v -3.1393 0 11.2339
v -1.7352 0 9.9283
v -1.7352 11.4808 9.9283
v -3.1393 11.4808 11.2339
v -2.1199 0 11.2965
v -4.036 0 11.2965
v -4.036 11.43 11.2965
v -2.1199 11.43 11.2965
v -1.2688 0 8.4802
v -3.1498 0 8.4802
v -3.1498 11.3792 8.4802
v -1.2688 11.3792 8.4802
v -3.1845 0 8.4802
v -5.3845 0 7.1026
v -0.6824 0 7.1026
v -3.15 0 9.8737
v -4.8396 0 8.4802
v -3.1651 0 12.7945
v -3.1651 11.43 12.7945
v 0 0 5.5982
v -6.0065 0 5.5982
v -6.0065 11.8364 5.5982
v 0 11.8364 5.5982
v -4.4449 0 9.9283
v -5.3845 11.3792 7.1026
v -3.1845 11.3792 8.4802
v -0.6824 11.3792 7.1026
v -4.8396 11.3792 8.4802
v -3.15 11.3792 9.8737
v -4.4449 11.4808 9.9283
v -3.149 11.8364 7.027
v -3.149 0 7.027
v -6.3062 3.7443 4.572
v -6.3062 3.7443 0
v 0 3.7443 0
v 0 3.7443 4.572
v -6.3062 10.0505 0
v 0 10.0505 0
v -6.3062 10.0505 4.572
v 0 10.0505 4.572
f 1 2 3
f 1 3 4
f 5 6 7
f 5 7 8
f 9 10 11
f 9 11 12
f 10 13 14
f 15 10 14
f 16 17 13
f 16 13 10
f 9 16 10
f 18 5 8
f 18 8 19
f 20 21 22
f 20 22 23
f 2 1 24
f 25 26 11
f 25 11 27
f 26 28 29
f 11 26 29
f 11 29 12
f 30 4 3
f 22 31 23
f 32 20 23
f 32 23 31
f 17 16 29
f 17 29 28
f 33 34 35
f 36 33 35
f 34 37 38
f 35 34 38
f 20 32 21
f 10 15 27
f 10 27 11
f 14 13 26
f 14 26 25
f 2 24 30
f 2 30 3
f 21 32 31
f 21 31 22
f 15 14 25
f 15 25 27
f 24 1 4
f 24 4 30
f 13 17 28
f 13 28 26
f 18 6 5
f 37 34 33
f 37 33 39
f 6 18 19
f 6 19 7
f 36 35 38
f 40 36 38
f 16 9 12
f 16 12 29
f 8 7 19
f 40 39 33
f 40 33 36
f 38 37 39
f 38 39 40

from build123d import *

# Parameters (mm, degrees)
F0_W      = 6.306209
F0_H      = 6.306208
F1_DEPTH  = 4.572
F3_DEPTH  = 11.43
F5_DEPTH  = 11.4808
F7_DEPTH  = 11.3792
F9_DEPTH  = 11.3792
F11_DEPTH = 11.8364


with BuildPart() as f1:
    # F0 (on Top) → F1 (new body)
    with BuildSketch(Plane.XY):
        with Locations((-3.153104, 6.897414)):
            Rectangle(F0_W, F0_H)
    extrude(amount=F1_DEPTH)


with BuildPart() as f3:
    # F2 (on Front) → F3 (new body)
    with BuildSketch(Plane.XZ):
        Polygon((-2.119942, 11.296483), (-3.165058, 12.794483), (-4.035988, 11.296483), align=None)
    extrude(amount=-F3_DEPTH)


with BuildPart() as f5:
    # F4 (on Front) → F5 (new body)
    with BuildSketch(Plane.XZ):
        Polygon((-1.735155, 9.928341), (-3.139272, 11.233923), (-4.444853, 9.928341), align=None)
    extrude(amount=-F5_DEPTH)


with BuildPart() as f7:
    # F6 (on Front) → F7 (new body)
    with BuildSketch(Plane.XZ):
        Polygon((-1.268789, 8.48022), (-3.149998, 9.873709), (-4.839602, 8.48022), align=None)
    extrude(amount=-F7_DEPTH)

    # F8 (on Front) → F9 (join)
    with BuildSketch(Plane.XZ):
        Polygon((-0.68238, 7.102603), (-3.168099, 8.490463), (-5.384531, 7.102603), align=None)
    extrude(amount=-F9_DEPTH)


with BuildPart() as f11:
    # F10 (on Front) → F11 (new body)
    with BuildSketch(Plane.XZ):
        Polygon((0, 5.598234), (-3.149002, 7.026985), (-6.006502, 5.598234), align=None)
    extrude(amount=-F11_DEPTH)


solid = Compound([f1.part, f3.part, f5.part, f7.part, f11.part])
